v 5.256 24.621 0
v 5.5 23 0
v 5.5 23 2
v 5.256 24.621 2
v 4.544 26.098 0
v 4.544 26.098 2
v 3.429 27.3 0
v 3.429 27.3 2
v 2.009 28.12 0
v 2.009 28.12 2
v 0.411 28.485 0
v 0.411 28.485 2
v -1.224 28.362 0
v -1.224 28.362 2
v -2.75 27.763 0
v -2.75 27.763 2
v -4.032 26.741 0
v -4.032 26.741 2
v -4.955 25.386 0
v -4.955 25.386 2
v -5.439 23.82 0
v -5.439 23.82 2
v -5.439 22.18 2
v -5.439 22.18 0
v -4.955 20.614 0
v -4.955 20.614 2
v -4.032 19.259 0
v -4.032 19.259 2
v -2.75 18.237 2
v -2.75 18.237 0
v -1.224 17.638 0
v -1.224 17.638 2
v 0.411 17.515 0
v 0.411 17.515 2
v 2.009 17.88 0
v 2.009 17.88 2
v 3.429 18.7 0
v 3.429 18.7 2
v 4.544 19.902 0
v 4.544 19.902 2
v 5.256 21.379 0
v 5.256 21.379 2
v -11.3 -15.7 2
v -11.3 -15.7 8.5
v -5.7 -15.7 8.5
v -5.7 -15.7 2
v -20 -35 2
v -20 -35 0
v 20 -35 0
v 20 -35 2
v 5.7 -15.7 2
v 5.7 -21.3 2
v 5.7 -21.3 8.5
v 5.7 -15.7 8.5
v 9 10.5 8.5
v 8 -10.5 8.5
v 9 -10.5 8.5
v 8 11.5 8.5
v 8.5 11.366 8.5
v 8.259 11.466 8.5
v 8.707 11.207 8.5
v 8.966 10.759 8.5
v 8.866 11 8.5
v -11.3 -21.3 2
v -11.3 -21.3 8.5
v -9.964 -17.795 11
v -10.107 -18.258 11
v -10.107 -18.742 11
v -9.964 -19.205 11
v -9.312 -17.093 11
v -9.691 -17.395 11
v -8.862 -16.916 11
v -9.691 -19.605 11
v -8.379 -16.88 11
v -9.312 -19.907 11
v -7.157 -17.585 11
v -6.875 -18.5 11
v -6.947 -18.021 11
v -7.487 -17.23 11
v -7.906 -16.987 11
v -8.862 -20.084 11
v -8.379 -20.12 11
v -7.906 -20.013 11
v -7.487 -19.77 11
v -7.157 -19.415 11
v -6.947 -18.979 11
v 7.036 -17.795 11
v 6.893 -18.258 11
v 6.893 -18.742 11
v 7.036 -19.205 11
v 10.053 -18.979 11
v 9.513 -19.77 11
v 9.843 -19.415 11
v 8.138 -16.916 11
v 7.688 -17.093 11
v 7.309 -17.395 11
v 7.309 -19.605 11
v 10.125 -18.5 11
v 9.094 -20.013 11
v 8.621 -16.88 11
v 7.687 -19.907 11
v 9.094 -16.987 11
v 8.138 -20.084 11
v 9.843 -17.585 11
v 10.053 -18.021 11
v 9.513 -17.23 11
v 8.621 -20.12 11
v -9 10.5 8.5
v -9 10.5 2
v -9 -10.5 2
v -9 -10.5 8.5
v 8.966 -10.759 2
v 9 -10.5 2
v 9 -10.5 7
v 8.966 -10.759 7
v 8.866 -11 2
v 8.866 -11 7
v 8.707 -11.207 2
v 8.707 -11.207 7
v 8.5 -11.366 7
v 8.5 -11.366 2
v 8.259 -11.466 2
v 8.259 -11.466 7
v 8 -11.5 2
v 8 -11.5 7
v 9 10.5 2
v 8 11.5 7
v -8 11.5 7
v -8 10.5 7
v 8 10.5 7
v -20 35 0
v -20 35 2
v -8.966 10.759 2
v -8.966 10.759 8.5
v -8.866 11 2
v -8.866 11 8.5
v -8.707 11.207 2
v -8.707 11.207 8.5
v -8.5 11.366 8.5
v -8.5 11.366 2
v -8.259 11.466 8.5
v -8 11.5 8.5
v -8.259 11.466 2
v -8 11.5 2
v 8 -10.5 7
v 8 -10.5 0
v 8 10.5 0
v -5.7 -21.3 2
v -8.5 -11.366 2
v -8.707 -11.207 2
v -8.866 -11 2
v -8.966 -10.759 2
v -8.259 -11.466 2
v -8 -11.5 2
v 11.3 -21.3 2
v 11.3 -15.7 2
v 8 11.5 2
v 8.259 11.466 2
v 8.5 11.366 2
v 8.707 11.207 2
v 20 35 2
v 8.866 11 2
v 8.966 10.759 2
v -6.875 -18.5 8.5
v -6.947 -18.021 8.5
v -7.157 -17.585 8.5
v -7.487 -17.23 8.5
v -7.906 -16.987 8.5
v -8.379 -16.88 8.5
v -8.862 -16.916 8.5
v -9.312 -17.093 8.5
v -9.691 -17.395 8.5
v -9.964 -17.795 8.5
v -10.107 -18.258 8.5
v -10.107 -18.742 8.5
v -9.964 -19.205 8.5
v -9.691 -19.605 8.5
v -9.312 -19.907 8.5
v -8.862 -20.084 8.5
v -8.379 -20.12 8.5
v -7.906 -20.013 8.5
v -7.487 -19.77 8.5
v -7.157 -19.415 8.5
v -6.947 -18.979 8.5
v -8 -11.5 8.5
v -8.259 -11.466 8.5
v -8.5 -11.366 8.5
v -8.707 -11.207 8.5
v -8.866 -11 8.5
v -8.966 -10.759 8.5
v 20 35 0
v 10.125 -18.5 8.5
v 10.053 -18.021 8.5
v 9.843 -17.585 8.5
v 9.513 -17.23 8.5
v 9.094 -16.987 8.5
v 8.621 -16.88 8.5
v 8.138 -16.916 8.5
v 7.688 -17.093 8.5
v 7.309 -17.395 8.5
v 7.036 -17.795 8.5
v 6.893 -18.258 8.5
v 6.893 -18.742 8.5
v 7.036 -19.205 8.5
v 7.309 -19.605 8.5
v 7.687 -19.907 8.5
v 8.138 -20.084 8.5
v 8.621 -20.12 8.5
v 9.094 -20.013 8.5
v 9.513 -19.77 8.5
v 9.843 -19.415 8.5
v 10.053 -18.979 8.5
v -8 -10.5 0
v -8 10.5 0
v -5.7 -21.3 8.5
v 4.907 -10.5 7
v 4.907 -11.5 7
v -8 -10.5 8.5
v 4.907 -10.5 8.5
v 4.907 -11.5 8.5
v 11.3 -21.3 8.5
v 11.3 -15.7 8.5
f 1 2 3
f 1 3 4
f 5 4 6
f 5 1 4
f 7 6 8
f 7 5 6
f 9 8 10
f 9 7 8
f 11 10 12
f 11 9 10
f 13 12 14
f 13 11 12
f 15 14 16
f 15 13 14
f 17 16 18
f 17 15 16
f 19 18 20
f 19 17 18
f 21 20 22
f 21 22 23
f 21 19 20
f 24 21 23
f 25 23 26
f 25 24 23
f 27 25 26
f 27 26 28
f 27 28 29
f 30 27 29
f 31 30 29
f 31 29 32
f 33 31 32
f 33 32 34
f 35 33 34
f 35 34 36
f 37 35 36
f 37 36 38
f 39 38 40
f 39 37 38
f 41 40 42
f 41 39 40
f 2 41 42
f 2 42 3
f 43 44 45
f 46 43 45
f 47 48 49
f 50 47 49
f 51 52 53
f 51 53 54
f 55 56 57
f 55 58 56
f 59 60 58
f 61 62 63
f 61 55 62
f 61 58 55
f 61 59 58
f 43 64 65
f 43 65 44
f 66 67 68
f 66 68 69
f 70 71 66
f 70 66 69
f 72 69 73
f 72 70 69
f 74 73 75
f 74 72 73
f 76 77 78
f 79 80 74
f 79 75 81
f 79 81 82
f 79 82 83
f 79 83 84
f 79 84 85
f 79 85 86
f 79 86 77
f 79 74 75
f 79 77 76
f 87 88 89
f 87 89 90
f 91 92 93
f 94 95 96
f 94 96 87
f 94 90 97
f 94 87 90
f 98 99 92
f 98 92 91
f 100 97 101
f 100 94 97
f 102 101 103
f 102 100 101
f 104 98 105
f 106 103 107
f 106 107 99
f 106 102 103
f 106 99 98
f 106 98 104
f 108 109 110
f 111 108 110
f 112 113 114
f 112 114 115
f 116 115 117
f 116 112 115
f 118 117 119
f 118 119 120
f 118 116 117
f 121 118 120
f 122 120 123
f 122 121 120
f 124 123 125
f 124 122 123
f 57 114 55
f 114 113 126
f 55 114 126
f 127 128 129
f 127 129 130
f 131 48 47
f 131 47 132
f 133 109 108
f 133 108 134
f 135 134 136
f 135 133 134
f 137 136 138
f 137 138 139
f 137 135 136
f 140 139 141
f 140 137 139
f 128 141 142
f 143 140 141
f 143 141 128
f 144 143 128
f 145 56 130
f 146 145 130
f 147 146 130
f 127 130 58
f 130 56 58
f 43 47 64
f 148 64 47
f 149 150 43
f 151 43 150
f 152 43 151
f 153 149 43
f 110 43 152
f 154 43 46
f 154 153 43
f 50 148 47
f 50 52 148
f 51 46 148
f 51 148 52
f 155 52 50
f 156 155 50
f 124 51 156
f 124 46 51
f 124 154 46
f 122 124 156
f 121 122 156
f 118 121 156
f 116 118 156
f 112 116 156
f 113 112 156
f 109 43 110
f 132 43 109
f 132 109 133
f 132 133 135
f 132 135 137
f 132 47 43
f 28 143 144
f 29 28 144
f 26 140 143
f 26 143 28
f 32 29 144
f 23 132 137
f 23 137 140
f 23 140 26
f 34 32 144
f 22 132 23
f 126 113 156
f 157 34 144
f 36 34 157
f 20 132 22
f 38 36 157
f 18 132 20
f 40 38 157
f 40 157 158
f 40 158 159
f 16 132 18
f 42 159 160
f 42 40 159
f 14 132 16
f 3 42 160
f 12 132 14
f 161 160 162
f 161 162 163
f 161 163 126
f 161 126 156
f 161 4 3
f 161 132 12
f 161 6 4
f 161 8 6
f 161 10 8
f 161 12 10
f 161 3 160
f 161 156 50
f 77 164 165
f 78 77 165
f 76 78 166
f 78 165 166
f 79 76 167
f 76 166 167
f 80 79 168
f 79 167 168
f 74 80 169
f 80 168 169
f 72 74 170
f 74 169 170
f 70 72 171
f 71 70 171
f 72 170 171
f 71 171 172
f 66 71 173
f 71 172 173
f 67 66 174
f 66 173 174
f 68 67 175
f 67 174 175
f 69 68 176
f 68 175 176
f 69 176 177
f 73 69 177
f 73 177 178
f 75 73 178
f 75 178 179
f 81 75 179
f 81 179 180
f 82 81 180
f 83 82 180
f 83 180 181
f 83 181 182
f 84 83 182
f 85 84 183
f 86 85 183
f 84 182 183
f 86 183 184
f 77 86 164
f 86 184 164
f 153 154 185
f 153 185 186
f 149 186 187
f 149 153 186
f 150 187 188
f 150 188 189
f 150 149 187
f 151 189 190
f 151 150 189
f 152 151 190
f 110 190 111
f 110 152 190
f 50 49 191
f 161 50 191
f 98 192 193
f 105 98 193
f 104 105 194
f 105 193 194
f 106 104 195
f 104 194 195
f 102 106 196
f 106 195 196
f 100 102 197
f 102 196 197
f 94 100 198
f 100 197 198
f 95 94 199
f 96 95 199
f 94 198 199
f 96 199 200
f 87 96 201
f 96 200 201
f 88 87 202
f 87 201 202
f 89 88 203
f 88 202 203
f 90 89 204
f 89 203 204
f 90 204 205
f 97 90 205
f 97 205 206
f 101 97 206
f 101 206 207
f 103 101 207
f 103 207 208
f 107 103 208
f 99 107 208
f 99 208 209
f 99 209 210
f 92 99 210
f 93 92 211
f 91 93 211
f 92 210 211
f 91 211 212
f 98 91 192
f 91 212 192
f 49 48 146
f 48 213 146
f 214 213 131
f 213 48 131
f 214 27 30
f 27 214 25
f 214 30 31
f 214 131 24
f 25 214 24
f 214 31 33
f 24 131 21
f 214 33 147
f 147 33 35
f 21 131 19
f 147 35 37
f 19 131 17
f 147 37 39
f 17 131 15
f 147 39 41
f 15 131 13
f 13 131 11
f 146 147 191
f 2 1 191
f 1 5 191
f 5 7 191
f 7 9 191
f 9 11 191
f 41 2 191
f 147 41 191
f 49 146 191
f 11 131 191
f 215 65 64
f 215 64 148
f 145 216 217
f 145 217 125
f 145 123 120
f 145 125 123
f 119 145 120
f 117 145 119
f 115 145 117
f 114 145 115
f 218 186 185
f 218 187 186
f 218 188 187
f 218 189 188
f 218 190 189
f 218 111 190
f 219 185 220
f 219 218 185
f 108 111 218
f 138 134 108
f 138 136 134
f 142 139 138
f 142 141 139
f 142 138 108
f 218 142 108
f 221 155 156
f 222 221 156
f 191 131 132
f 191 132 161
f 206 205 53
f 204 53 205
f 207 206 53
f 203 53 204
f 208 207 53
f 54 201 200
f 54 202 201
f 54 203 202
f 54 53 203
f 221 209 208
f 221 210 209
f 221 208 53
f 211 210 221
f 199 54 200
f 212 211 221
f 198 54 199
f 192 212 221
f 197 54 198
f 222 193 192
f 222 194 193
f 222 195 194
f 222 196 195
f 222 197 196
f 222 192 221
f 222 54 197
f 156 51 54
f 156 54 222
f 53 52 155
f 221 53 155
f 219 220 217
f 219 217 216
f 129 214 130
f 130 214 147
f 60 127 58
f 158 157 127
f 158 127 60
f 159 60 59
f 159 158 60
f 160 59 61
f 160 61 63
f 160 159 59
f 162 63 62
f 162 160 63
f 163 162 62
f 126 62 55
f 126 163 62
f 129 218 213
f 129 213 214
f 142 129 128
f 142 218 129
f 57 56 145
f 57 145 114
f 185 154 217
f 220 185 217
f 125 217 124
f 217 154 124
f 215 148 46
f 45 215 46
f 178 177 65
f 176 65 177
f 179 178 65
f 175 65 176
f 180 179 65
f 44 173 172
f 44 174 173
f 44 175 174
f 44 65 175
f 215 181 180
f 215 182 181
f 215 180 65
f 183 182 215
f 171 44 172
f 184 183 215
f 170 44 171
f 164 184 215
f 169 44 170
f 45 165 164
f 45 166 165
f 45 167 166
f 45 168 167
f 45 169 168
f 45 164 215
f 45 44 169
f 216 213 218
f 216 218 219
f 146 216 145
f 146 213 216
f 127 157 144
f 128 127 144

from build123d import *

# Parameters (mm, degrees)
SKETCH_W      = 40
SKETCH_H      = 70
SKETCH_R      = 5.5
SKETCH_W_2    = 16
SKETCH_H_2    = 21
PAD_DEPTH     = 2
SKETCH001_W   = 5.6
SKETCH001_H   = 5.6
SKETCH001_W_2 = 16
SKETCH001_H_2 = 21
PAD001_DEPTH  = 6.5
SKETCH002_W   = 16
SKETCH002_H   = 1
SKETCH002_W_2 = 4.092667
POCKET_DEPTH  = 1.5
SKETCH003_R   = 1.625
PAD002_DEPTH  = 2.5


with BuildPart() as part:
    # Sketch → Pad (new body)
    with BuildSketch(Plane.XY):
        Rectangle(SKETCH_W, SKETCH_H)
        with Locations((0, 23)):
            Circle(SKETCH_R, mode=Mode.SUBTRACT)
        Rectangle(SKETCH_W_2, SKETCH_H_2, mode=Mode.SUBTRACT)
    extrude(amount=PAD_DEPTH)

    # Sketch001 (on Face11 of Pad) → Pad001 (join)
    with BuildSketch(Plane.XY.offset(2)):
        with Locations((-8.5, -18.5)):
            Rectangle(SKETCH001_W, SKETCH001_H)
        with Locations((8.5, -18.5)):
            Rectangle(SKETCH001_W, SKETCH001_H)
        with BuildLine():
            Line((-8, -11.5), (8, -11.5))
            ThreePointArc((9, -10.5), (8.7071067812, -11.2071067812), (8, -11.5))
            Line((9, -10.5), (9, 10.5))
            ThreePointArc((8, 11.5), (8.7071067812, 11.2071067812), (9, 10.5))
            Line((8, 11.5), (-8, 11.5))
            ThreePointArc((-9, 10.5), (-8.7071067812, 11.2071067812), (-8, 11.5))
            Line((-9, 10.5), (-9, -10.5))
            ThreePointArc((-8, -11.5), (-8.7071067812, -11.2071067812), (-9, -10.5))
        make_face()
        Rectangle(SKETCH001_W_2, SKETCH001_H_2, mode=Mode.SUBTRACT)
    extrude(amount=PAD001_DEPTH)

    # Sketch002 (on Face34 of Pad001) → Pocket (cut)
    with BuildSketch(Plane.XY.offset(8.5)):
        with Locations((0, 11)):
            Rectangle(SKETCH002_W, SKETCH002_H)
        with Locations((6.9536665, -11)):
            Rectangle(SKETCH002_W_2, SKETCH002_H)
    extrude(amount=-POCKET_DEPTH, mode=Mode.SUBTRACT)

    # Sketch003 (on Face32 of Pocket) → Pad002 (join)
    with BuildSketch(Plane.XY.offset(8.5)):
        with Locations((-8.5, -18.5)):
            Circle(SKETCH003_R)
        with Locations((8.5, -18.5)):
            Circle(SKETCH003_R)
    extrude(amount=PAD002_DEPTH)


solid = part.part
